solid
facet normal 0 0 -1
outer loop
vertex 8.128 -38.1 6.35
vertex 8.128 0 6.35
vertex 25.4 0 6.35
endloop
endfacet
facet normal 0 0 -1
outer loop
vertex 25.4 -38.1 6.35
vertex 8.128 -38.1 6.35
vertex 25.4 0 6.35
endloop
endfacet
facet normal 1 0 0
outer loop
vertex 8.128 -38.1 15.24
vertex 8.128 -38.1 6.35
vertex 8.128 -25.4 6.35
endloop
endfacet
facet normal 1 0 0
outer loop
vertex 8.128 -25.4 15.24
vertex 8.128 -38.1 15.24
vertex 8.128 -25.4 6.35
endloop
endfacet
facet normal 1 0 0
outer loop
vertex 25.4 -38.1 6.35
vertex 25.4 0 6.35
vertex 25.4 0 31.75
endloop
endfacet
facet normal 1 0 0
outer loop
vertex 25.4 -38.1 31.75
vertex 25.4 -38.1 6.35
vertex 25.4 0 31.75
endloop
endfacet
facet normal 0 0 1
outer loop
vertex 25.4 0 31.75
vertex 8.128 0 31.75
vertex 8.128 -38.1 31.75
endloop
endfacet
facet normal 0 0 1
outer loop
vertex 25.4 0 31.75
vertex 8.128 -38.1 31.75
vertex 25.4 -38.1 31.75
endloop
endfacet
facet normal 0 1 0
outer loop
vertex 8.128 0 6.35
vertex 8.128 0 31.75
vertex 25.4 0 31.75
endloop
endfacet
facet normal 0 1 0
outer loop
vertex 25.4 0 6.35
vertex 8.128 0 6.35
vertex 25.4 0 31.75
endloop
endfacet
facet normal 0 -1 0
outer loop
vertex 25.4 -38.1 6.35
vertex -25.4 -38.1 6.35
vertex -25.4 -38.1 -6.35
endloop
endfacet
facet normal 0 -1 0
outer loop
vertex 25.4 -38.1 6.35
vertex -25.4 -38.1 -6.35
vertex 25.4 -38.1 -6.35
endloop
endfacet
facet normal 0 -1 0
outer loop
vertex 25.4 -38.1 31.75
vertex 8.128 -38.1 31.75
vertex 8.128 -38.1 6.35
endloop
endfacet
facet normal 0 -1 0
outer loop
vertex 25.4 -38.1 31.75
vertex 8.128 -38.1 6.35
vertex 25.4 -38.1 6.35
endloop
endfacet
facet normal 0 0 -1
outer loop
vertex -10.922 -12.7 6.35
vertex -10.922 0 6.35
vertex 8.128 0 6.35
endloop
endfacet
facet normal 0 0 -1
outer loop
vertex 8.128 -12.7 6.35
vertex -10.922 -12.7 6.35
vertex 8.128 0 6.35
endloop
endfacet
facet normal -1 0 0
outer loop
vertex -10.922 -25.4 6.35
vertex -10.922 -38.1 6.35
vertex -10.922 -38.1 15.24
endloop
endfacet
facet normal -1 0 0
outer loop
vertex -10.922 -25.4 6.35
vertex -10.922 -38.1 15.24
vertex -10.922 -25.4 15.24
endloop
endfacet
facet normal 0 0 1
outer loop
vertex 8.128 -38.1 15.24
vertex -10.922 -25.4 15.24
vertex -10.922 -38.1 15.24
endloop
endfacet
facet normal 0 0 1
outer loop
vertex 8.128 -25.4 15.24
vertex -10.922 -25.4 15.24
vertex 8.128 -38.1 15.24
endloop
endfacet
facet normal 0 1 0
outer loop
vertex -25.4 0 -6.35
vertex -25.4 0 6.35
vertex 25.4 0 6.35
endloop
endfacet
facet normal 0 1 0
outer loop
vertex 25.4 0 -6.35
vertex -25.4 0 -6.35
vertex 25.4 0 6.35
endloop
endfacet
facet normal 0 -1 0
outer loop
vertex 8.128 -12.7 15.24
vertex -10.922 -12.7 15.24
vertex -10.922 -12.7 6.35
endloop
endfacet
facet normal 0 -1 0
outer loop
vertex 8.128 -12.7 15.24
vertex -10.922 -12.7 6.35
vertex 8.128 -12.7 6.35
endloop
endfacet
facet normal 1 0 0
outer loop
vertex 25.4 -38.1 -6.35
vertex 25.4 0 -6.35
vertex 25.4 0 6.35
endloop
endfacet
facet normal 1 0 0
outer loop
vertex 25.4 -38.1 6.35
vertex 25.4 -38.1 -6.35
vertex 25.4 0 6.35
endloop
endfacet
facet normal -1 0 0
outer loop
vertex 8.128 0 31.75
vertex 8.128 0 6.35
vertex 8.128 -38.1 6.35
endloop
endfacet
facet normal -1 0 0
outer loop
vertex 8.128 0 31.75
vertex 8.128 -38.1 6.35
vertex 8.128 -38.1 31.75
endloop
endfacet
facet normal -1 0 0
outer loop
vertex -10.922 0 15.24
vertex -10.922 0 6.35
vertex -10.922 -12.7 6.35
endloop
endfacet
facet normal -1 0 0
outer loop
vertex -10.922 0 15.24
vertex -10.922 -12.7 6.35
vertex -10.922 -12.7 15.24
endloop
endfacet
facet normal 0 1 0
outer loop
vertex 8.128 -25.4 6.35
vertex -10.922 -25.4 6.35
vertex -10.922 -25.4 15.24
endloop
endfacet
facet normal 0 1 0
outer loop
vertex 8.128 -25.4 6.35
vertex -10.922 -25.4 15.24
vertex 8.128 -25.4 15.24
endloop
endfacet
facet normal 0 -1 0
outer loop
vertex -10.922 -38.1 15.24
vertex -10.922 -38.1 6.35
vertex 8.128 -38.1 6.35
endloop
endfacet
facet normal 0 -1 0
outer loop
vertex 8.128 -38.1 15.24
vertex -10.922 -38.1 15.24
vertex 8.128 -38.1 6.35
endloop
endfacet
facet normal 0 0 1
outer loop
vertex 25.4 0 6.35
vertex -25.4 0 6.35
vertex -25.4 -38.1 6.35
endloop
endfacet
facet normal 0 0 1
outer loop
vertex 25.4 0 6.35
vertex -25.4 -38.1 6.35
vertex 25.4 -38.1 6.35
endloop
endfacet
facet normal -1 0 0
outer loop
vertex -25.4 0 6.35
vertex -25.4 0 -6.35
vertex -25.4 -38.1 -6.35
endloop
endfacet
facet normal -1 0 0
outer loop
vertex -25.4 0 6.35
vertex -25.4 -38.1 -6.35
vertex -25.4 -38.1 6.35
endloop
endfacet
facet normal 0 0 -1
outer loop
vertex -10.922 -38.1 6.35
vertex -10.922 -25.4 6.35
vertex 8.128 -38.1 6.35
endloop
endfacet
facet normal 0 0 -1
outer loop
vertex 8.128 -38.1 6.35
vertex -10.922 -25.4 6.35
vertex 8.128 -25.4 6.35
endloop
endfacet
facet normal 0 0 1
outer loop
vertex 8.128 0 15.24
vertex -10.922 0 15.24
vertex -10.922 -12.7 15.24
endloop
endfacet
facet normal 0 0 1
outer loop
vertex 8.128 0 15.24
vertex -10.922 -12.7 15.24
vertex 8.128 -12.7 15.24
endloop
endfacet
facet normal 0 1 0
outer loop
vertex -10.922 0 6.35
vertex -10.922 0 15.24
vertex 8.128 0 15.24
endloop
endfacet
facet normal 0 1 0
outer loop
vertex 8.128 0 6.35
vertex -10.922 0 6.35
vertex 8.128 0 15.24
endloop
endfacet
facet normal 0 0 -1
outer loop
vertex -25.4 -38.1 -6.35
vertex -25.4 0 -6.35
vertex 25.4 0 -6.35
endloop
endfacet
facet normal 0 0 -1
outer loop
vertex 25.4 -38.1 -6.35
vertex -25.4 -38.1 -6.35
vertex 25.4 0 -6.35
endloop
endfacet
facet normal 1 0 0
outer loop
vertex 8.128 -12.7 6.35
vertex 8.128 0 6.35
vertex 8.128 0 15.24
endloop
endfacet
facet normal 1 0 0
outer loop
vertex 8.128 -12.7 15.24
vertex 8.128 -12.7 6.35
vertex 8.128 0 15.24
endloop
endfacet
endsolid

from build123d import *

# Parameters (mm, degrees)
F0_W     = 50.8
F0_H     = 12.7
F1_DEPTH = 38.1
F2_W     = 19.05
F2_H     = 8.89
F3_DEPTH = 12.7
F4_W     = 17.272346
F4_H     = 25.4
F5_DEPTH = 38.1
F6_W     = 19.05
F6_H     = 12.7
F7_DEPTH = 8.89


with BuildPart() as f1:
    # F0 (on Front) → F1 (new body)
    with BuildSketch(Plane.XZ):
        Rectangle(F0_W, F0_H)
    extrude(amount=F1_DEPTH)


with BuildPart() as f3:
    # F2 (on Front) → F3 (new body)
    with BuildSketch(Plane.XZ):
        with Locations((-1.397346, 10.795)):
            Rectangle(F2_W, F2_H)
    extrude(amount=F3_DEPTH)


with BuildPart() as f5:
    # F4 (on Front) → F5 (new body)
    with BuildSketch(Plane.XZ):
        with Locations((16.763827, 19.05)):
            Rectangle(F4_W, F4_H)
    extrude(amount=F5_DEPTH)


with BuildPart() as f7:
    # F6 (on face) → F7 (new body)
    with BuildSketch(Plane.XY.offset(6.35)):
        with Locations((-1.397346, -31.75)):
            Rectangle(F6_W, F6_H)
    extrude(amount=F7_DEPTH)


solid = Compound([f1.part, f3.part, f5.part, f7.part])
